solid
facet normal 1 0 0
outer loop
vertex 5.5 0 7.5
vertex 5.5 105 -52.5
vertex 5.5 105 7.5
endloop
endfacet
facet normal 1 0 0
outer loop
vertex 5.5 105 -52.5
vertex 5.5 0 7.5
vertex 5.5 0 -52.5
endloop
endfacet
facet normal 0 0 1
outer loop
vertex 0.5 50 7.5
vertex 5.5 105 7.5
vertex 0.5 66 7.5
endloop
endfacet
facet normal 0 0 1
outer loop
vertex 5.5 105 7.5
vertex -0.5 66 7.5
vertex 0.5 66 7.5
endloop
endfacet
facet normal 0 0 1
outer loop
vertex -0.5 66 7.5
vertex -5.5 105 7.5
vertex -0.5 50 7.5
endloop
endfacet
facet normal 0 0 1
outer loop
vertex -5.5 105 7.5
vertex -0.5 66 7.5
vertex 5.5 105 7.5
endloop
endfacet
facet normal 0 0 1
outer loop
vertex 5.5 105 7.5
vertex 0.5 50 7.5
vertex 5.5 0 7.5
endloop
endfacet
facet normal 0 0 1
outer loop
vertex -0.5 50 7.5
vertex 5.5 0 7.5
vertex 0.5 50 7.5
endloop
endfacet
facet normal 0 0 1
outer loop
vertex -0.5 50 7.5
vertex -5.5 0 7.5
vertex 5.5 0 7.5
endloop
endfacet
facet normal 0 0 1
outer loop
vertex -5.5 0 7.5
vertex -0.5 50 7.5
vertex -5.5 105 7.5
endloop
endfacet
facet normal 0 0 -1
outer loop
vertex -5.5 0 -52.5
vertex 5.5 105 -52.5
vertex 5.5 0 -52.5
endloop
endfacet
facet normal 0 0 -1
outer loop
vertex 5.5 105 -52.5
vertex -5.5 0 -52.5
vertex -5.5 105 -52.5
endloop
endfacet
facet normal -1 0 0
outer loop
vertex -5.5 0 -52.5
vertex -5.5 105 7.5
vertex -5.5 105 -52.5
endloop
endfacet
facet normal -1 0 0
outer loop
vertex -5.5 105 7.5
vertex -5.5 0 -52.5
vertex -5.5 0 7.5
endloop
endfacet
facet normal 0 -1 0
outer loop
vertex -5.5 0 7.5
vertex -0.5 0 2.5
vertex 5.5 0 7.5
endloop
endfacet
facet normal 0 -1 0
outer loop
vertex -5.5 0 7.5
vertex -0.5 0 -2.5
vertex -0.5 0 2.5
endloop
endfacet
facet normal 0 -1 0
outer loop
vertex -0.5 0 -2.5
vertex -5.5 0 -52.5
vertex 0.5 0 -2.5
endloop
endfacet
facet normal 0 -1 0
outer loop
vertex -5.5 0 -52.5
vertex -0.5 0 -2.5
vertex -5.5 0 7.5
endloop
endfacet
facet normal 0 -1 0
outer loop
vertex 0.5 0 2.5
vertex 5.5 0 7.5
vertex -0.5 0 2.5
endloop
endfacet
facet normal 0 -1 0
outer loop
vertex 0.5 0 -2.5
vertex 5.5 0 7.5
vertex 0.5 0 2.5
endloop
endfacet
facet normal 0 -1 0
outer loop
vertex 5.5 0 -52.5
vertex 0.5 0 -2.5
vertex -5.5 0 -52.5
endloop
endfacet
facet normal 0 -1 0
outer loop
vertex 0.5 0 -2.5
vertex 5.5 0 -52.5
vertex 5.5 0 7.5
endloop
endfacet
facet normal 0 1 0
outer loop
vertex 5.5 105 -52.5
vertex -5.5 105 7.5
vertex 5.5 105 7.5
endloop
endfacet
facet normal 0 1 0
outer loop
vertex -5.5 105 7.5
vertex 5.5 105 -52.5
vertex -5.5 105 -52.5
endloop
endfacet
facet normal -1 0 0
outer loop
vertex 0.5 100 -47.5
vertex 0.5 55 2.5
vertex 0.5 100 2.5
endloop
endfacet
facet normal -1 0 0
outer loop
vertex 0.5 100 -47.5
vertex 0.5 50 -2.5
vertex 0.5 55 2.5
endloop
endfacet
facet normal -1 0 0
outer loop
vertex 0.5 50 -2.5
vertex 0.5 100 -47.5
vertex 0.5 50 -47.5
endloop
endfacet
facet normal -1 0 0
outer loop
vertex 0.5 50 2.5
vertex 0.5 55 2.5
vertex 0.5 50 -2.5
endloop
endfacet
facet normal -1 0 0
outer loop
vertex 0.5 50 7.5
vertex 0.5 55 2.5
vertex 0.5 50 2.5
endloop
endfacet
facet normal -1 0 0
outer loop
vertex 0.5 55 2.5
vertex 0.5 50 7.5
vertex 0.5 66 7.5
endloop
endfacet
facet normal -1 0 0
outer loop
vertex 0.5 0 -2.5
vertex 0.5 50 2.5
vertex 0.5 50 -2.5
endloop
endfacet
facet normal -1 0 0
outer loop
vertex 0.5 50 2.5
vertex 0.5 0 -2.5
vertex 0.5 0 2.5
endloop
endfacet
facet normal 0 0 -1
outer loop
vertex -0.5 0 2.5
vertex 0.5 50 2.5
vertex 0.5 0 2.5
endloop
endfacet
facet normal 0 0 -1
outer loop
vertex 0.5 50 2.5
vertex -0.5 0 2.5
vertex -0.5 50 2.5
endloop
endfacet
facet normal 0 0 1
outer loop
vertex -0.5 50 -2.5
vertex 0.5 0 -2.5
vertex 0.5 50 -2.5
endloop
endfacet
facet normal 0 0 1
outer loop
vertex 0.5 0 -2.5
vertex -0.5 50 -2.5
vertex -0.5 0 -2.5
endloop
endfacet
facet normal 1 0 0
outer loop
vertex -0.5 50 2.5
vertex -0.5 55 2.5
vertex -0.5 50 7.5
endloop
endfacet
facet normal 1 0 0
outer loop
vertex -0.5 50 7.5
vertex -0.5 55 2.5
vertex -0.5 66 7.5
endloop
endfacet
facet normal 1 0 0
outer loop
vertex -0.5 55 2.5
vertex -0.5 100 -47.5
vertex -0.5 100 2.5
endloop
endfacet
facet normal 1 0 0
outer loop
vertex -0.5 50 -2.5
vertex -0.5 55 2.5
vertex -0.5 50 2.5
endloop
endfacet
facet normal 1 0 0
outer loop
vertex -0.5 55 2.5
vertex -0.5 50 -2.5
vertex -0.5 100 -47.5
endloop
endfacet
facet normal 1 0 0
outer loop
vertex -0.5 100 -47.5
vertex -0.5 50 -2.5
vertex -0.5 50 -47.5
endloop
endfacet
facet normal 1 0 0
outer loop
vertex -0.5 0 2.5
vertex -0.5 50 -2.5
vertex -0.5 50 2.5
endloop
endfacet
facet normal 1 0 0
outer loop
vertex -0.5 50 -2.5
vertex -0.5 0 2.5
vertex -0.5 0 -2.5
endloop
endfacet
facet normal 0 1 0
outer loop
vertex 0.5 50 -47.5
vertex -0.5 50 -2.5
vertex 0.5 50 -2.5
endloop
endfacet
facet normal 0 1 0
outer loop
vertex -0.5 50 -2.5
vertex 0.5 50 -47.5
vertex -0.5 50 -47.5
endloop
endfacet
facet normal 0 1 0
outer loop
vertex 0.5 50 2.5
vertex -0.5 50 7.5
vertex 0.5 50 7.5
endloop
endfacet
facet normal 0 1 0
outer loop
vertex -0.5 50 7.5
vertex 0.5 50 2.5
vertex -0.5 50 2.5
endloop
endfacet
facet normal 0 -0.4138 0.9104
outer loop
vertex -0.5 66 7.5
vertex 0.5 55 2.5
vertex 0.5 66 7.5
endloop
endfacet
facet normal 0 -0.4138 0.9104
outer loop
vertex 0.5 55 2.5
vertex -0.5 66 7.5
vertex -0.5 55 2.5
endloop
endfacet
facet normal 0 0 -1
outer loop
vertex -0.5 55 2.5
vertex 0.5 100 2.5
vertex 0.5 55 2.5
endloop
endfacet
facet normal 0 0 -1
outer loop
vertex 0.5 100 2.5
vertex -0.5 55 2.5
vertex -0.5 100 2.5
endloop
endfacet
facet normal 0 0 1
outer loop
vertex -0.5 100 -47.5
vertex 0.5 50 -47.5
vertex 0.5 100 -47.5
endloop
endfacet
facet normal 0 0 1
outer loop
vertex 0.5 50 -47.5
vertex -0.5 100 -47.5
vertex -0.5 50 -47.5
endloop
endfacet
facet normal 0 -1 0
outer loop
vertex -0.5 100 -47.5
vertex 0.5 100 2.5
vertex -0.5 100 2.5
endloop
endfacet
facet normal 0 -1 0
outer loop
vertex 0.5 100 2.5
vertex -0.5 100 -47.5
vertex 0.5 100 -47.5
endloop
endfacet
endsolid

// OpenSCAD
// Baseline CAD geometry, with all dimensions in millimetres; +Y follows the throat and +Z is up.
// Positive modules describe air/cutting volumes; skin modules describe outer material.
// solidBody subtracts the former from the latter. The thin spawn cube spans Y=-1 to 0,
// so the generator can retain its Y=0 face and construct the inlet boundary rectangle.
// The final two calls display BOTH objects. Export each module separately as ASCII STL
// using the wrapper procedure in README; exporting this complete scene combines them.

skinThickness = 5;

throatWidth = 1;
throatLength = 50;
throatHeight = 5;

voicingHoleWidth = 1;
voicingHoleLength = 5;
voicingHoleHeight = skinThickness;
voicingHoleX = -voicingHoleWidth / 2;
voicingHoleY = throatLength;
voicingHoleZ = throatHeight / 2;

voicingEdgeLength = 10;

pressureChamberWidth = 1;
pressureChamberLength = 50;
pressureChamberHeight = 50;
pressureChamberX = -pressureChamberWidth / 2;
pressureChamberY = throatLength;
pressureChamberZ = -pressureChamberHeight + throatHeight / 2;


module throatPositive() {
    translate([-throatWidth / 2, -1, -throatHeight / 2])
    cube([throatWidth, throatLength + 2, throatHeight]);
}

module throatSkin() {
    translate([-(pressureChamberWidth + skinThickness * 2) / 2, 0, pressureChamberZ - skinThickness])
    cube([pressureChamberWidth + skinThickness * 2, throatLength - 1, pressureChamberHeight + skinThickness * 2]);
}

module voicingHolePositive() {
    translate([voicingHoleX, voicingHoleY, voicingHoleZ - 1])
    cube([voicingHoleWidth, voicingHoleLength, voicingHoleHeight + 2]);
}

module voicingEdgePositive() {
    translate([voicingHoleWidth / 2, voicingHoleY + voicingHoleLength - 0.00001, throatHeight / 2])
    rotate([0, -90, 0])
    linear_extrude(height = voicingHoleWidth)
    polygon([
        [0, 0],
        [skinThickness + 0.00001, 0],
        [skinThickness + 0.00001, voicingEdgeLength + 1]
    ]);
}

module pressureChamberPositive() {
    translate([pressureChamberX, pressureChamberY, pressureChamberZ])
    cube([pressureChamberWidth, pressureChamberLength, pressureChamberHeight]);
}

module pressureChamberSkin() {
    translate([pressureChamberX - skinThickness, pressureChamberY - skinThickness, pressureChamberZ - skinThickness])
    cube([pressureChamberWidth + skinThickness * 2, pressureChamberLength + skinThickness * 2, pressureChamberHeight + skinThickness * 2]);
}

module positiveGroup() {
    union() {
        throatPositive();
        voicingHolePositive();
        voicingEdgePositive();
        pressureChamberPositive();
    }
}

module skinGroup() {
    union() {
        throatSkin();
        pressureChamberSkin();
    }
}

module solidBody() {
    difference() {
        skinGroup();
        positiveGroup();
    }
}

module spawnPlane() {
    translate([-throatWidth / 2, -1, -throatHeight / 2])
    cube([throatWidth, 1, throatHeight]);
}

solidBody();
*spawnPlane();
